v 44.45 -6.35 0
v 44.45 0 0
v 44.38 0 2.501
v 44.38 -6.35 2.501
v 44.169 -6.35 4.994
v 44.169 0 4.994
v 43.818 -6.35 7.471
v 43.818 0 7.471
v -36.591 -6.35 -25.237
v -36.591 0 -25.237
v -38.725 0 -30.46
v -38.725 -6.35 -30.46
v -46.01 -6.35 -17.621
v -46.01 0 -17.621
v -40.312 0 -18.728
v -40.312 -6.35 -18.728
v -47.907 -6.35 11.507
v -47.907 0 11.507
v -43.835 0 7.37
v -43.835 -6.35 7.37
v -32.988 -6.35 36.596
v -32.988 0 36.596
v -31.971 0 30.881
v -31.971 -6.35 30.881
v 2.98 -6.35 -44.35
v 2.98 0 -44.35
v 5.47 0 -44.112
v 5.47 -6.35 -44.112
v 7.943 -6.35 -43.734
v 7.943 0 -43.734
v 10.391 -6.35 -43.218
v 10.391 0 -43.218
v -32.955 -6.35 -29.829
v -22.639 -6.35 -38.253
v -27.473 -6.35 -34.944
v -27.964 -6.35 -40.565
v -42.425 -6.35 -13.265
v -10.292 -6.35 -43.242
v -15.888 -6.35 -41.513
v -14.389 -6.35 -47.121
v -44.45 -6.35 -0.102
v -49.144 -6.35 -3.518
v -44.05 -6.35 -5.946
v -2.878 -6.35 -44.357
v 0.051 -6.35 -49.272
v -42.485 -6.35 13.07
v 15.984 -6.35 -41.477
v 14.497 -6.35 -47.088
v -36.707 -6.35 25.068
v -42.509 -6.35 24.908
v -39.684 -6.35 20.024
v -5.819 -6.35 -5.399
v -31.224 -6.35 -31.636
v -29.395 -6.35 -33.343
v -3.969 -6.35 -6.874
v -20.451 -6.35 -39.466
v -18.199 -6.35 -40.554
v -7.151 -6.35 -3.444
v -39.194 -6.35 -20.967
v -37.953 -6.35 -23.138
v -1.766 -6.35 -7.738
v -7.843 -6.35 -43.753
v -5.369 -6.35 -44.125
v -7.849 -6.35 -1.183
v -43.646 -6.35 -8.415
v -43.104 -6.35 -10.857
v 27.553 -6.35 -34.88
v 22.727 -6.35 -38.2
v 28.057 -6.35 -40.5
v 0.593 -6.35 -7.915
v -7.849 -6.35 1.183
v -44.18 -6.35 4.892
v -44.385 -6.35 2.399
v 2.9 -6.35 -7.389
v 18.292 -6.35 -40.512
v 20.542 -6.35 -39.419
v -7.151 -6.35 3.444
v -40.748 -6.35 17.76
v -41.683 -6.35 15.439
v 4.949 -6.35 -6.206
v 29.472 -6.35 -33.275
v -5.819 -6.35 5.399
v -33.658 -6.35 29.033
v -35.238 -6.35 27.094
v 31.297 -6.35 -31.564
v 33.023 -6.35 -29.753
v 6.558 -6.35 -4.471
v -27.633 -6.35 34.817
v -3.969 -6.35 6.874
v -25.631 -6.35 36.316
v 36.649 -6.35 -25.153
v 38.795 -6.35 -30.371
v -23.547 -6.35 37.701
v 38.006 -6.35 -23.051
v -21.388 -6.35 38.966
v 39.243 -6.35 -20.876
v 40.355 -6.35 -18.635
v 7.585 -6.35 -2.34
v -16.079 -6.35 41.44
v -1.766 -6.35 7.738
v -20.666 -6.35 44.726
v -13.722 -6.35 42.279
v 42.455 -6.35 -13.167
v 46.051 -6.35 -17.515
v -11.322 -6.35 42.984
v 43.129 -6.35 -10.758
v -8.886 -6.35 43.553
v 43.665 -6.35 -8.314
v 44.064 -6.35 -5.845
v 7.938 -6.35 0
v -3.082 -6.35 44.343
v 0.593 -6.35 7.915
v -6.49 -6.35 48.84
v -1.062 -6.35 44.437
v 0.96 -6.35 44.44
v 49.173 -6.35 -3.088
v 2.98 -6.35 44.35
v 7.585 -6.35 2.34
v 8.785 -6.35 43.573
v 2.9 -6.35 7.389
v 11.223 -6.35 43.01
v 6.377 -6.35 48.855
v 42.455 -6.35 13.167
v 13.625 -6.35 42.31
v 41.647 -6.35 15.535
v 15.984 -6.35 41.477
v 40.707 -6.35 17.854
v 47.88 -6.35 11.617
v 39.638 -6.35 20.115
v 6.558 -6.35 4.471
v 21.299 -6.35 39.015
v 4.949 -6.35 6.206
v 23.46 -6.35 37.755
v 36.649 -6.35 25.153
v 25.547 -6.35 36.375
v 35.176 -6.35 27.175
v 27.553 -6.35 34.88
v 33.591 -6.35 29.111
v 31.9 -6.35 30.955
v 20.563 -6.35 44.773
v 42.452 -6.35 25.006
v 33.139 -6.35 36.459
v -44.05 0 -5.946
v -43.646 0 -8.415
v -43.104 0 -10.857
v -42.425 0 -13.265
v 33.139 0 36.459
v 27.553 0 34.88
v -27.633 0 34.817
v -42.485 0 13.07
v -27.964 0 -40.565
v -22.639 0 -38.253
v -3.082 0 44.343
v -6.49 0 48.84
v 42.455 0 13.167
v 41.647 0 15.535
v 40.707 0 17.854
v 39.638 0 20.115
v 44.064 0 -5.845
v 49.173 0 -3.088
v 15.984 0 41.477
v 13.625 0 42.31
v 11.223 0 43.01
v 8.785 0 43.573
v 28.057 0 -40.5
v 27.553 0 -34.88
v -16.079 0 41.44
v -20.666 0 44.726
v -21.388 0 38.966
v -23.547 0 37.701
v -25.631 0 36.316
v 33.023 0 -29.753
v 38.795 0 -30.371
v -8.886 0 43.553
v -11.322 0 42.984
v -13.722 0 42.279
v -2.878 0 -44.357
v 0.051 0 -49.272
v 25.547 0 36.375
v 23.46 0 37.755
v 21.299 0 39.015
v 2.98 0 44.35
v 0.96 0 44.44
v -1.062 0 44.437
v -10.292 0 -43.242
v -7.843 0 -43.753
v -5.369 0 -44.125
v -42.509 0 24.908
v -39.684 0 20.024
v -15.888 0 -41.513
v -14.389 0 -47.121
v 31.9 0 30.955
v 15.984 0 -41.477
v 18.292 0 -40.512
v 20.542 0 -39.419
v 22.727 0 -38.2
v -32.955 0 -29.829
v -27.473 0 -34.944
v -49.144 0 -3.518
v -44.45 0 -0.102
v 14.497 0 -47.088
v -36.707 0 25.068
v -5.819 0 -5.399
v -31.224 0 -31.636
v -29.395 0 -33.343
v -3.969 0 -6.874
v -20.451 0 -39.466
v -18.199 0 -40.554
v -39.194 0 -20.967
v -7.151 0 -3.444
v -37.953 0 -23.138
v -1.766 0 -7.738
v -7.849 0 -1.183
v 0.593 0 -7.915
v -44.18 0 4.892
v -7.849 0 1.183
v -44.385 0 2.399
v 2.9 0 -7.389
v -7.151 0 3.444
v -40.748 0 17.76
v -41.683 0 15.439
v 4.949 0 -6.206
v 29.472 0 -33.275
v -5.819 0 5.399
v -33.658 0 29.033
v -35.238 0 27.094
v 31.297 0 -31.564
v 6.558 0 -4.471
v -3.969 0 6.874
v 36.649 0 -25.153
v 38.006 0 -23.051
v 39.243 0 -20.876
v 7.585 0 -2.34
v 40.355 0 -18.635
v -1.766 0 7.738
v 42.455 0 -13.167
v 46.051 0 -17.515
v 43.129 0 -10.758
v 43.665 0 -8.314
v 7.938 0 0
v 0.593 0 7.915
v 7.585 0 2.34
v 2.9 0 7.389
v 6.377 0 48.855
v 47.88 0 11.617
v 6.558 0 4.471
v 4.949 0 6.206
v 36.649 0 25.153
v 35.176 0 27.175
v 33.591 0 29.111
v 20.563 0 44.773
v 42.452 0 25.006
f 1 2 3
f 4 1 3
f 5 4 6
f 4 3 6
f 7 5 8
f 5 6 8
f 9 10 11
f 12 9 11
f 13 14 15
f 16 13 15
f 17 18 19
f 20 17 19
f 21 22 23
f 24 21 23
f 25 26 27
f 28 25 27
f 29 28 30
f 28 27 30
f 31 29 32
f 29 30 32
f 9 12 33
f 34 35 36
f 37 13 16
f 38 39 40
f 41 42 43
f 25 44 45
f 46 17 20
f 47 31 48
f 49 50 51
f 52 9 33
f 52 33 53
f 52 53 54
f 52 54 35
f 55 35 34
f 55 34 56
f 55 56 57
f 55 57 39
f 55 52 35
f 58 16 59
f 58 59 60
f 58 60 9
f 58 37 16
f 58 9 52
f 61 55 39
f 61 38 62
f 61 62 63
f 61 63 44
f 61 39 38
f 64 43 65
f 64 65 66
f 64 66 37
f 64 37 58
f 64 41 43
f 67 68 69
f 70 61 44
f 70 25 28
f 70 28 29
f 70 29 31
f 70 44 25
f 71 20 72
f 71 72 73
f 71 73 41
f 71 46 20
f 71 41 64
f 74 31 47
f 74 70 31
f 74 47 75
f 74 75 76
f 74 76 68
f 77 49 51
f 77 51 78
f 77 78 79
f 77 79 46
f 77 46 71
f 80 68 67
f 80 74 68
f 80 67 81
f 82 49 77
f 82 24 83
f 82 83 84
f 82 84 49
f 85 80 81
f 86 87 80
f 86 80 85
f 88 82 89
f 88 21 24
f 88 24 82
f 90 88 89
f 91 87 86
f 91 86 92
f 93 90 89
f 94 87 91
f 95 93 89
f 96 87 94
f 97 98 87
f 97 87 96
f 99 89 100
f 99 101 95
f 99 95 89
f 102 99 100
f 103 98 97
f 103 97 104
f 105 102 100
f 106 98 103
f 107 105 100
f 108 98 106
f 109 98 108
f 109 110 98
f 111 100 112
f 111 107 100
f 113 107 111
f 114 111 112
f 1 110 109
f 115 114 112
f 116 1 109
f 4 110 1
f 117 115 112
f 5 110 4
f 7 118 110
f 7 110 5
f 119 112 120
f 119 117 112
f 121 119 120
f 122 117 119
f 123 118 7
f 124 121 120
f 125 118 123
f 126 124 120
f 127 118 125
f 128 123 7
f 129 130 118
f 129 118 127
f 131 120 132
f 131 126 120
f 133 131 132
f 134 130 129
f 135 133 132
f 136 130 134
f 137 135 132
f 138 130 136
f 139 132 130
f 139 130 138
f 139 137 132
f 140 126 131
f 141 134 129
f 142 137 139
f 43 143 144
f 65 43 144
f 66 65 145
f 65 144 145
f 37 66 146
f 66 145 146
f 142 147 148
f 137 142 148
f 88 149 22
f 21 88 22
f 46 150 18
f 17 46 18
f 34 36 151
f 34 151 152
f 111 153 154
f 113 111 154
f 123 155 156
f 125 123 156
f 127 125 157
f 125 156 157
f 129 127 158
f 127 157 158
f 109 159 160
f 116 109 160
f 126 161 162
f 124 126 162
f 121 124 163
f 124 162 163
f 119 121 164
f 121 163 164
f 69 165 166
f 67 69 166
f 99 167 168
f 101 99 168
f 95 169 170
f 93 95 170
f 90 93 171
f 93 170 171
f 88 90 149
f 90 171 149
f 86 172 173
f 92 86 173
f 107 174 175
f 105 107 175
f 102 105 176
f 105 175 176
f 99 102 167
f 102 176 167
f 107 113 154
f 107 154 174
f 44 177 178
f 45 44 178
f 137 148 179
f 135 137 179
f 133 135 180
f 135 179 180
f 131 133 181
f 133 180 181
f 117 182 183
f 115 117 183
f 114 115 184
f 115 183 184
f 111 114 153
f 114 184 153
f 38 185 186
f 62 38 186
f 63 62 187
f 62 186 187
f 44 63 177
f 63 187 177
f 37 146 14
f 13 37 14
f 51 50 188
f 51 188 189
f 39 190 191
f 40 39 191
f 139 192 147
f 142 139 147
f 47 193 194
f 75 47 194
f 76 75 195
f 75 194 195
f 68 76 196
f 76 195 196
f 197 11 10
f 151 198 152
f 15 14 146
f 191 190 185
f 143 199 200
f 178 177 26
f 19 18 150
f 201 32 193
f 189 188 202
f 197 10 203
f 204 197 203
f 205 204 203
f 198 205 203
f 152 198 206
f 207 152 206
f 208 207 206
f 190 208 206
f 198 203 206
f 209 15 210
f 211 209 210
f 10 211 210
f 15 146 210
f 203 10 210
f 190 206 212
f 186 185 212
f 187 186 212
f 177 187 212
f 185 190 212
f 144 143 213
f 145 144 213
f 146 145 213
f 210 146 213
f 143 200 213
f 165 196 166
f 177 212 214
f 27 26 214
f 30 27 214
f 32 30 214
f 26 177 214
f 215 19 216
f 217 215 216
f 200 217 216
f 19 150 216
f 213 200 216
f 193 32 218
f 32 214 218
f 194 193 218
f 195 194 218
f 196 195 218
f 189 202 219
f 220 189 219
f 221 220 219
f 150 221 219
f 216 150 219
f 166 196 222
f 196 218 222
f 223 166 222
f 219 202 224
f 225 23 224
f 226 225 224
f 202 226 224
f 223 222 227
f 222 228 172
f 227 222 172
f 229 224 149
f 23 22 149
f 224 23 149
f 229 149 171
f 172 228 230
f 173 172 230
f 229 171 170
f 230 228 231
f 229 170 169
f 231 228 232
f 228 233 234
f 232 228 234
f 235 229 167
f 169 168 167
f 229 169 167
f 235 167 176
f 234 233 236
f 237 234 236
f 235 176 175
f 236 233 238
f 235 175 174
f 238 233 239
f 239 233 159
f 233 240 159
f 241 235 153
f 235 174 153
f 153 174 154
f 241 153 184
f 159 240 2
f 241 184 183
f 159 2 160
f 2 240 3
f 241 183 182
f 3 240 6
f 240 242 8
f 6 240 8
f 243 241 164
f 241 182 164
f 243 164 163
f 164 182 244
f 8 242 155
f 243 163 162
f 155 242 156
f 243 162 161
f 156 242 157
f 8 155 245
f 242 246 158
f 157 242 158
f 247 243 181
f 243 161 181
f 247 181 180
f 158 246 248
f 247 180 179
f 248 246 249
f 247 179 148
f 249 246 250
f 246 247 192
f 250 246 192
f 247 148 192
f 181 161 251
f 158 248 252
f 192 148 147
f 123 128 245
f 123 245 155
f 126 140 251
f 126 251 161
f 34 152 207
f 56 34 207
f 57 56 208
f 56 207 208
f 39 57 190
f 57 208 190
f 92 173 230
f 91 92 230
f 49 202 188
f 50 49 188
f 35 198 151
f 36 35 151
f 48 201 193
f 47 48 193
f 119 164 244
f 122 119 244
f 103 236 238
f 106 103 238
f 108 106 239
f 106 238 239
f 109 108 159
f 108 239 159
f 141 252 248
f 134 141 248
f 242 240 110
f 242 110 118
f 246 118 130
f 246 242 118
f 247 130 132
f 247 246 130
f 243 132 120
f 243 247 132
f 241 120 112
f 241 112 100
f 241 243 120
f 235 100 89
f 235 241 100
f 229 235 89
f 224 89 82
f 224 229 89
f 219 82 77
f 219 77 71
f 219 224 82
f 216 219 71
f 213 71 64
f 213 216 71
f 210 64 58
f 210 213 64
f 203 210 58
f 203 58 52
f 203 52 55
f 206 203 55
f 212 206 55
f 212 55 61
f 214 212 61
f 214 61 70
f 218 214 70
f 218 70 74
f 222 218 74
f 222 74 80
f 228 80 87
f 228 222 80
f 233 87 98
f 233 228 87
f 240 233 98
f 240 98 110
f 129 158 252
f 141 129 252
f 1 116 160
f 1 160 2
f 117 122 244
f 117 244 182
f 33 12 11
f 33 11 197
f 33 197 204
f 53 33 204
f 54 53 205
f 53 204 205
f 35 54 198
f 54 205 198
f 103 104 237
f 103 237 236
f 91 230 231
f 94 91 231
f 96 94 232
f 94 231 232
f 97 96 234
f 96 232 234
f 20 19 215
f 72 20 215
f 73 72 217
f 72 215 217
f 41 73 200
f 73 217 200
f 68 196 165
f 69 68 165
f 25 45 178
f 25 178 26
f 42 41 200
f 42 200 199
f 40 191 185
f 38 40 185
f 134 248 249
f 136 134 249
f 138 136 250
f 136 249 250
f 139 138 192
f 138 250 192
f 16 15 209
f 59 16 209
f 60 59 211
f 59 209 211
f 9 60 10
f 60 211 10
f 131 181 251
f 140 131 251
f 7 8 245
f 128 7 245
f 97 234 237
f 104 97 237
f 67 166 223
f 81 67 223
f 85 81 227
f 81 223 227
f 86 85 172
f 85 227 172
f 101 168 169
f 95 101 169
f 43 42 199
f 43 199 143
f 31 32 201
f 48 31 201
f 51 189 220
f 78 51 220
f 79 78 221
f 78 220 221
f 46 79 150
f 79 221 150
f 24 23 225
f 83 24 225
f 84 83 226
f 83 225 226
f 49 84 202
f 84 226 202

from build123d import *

# Parameters (mm, degrees)
F0_R     = 7.9375
F1_DEPTH = 6.35


with BuildPart() as f1:
    # F0 (on Front) → F1 (new body)
    with BuildSketch(Plane.XZ):
        with BuildLine():
            ThreePointArc((44.0640721068, -5.844659902), (44.3534130882, -2.9286938091), (44.45, 0))
            ThreePointArc((44.45, 0), (44.2916429403, 3.7487151993), (43.8177000834, 7.4707201392))
            ThreePointArc((43.8177000834, 7.4707201392), (43.2302609799, 10.3415199856), (42.4549488772, 13.1673769534))
            ThreePointArc((42.4549488772, 13.1673769534), (41.1932213858, 16.7009284729), (39.6379848993, 20.1154829204))
            ThreePointArc((39.6379848993, 20.1154829204), (38.2264978161, 22.6834160724), (36.6488834271, 25.1527700969))
            ThreePointArc((36.6488834271, 25.1527700969), (34.3970458346, 28.1539648691), (31.900123201, 30.9545576574))
            ThreePointArc((31.900123201, 30.9545576574), (29.7912918003, 32.9891108226), (27.552991384, 34.8802976735))
            ThreePointArc((27.552991384, 34.8802976735), (24.5131823233, 37.0797302092), (21.2987124989, 39.0149631025))
            ThreePointArc((21.2987124989, 39.0149631025), (20.0011436472, 39.6958027102), (18.6818383084, 40.3335024194))
            Line((18.6818383084, 40.3335024194), (15.9837753185, 41.476757667))
            ThreePointArc((15.9837753185, 41.476757667), (12.4288665323, 42.6769935296), (8.7853998717, 43.5731482578))
            Line((8.7853998717, 43.5731482578), (5.8953894288, 44.0573136208))
            ThreePointArc((5.8953894288, 44.0573136208), (4.4399865206, 44.227695166), (2.9797584028, 44.3500117233))
            ThreePointArc((2.9797584028, 44.3500117233), (-0.0511777408, 44.4499705381), (-3.0818756726, 44.3430326245))
            ThreePointArc((-3.0818756726, 44.3430326245), (-5.99682497, 44.0436214483), (-8.8857128589, 43.5528025159))
            ThreePointArc((-8.8857128589, 43.5528025159), (-12.5271062762, 42.6482603203), (-16.0792418436, 41.4398417195))
            ThreePointArc((-16.0792418436, 41.4398417195), (-18.7746650962, 40.2903766491), (-21.3884961364, 38.9658149282))
            ThreePointArc((-21.3884961364, 38.9658149282), (-24.5985011604, 37.0231851772), (-27.6332375088, 34.8167586772))
            ThreePointArc((-27.6332375088, 34.8167586772), (-29.8671771379, 32.9204226858), (-31.9713179637, 30.8810188896))
            ThreePointArc((-31.9713179637, 30.8810188896), (-34.4617850273, 28.0746838403), (-36.7067057715, 25.0683116983))
            ThreePointArc((-36.7067057715, 25.0683116983), (-38.2786297743, 22.5953314338), (-39.6841999125, 20.0241548461))
            ThreePointArc((-39.6841999125, 20.0241548461), (-41.2315695506, 16.6060281944), (-42.4851569561, 13.0695806519))
            ThreePointArc((-42.4851569561, 13.0695806519), (-43.253959877, 10.2419458581), (-43.8347868066, 7.3698009215))
            ThreePointArc((-43.8347868066, 7.3698009215), (-44.3001577128, 3.6467144971), (-44.4498821525, -0.1023554137))
            ThreePointArc((-44.4498821525, -0.1023554137), (-44.3465515673, -3.0308190466), (-44.0504967316, -5.9461111405))
            ThreePointArc((-44.0504967316, -5.9461111405), (-43.3920943841, -9.6399504647), (-42.424515682, -13.2651034351))
            ThreePointArc((-42.424515682, -13.2651034351), (-41.4583271722, -16.0315192069), (-40.3119662534, -18.7282641156))
            ThreePointArc((-40.3119662534, -18.7282641156), (-38.5888928498, -22.0612748641), (-36.5908667529, -25.2370951235))
            ThreePointArc((-36.5908667529, -25.2370951235), (-34.8485512733, -27.5931327354), (-32.954788597, -29.8292542402))
            ThreePointArc((-32.954788597, -29.8292542402), (-30.3217176818, -32.5022451044), (-27.4725991601, -34.943651718))
            ThreePointArc((-27.4725991601, -34.943651718), (-25.1105575411, -36.6778189097), (-22.6393887587, -38.2525891494))
            ThreePointArc((-22.6393887587, -38.2525891494), (-19.3326807859, -40.025616218), (-15.8882240398, -41.5134536851))
            ThreePointArc((-15.8882240398, -41.5134536851), (-13.1184874977, -42.4700810662), (-10.2917397433, -43.2421390897))
            ThreePointArc((-10.2917397433, -43.2421390897), (-6.6082249244, -43.9560446736), (-2.877625333, -44.3567556573))
            ThreePointArc((-2.877625333, -44.3567556573), (0.0511777408, -44.4499705381), (2.9797584028, -44.3500117233))
            ThreePointArc((2.9797584028, -44.3500117233), (6.7094253828, -43.9407113169), (10.391286519, -43.2183255631))
            ThreePointArc((10.391286519, -43.2183255631), (13.2162489541, -42.4397604091), (15.9837753185, -41.476757667))
            ThreePointArc((15.9837753185, -41.476757667), (19.4247968758, -39.9809925631), (22.7274133165, -38.2003558091))
            ThreePointArc((22.7274133165, -38.2003558091), (25.1949493097, -36.619899362), (27.552991384, -34.8802976735))
            ThreePointArc((27.552991384, -34.8802976735), (30.3964805031, -32.4323368419), (33.0233893173, -29.7532898685))
            ThreePointArc((33.0233893173, -29.7532898685), (34.9119978358, -27.5128135078), (36.6488834271, -25.1527700969))
            ThreePointArc((36.6488834271, -25.1527700969), (38.6395912369, -21.9723573847), (40.3549851186, -18.6353877362))
            ThreePointArc((40.3549851186, -18.6353877362), (40.9473091431, -17.2950968178), (41.4951331794, -15.9360102417))
            Line((41.4951331794, -15.9360102417), (42.4549488772, -13.1673769534))
            ThreePointArc((42.4549488772, -13.1673769534), (43.4141773417, -9.5400055419), (44.0640721068, -5.844659902))
        make_face()
        Circle(F0_R, mode=Mode.SUBTRACT)
        with BuildLine():
            Line((49.1725476546, -3.0876265469), (44.45, 0))
            ThreePointArc((44.45, 0), (44.3534130882, -2.9286938091), (44.0640721068, -5.844659902))
            Line((44.0640721068, -5.844659902), (49.1725476546, -3.0876265469))
        make_face()
        with BuildLine():
            ThreePointArc((42.4549488772, 13.1673769534), (43.2302609799, 10.3415199856), (43.8177000834, 7.4707201392))
            Line((43.8177000834, 7.4707201392), (47.8801786158, 11.6172878184))
            Line((47.8801786158, 11.6172878184), (42.4549488772, 13.1673769534))
        make_face()
        with BuildLine():
            Line((46.0508898584, -17.5153767813), (42.4549488772, -13.1673769534))
            ThreePointArc((42.4549488772, -13.1673769534), (41.997861873, -14.5596050118), (41.4951331794, -15.9360102417))
            ThreePointArc((41.4951331794, -15.9360102417), (40.9473091431, -17.2950968178), (40.3549851186, -18.6353877362))
            Line((40.3549851186, -18.6353877362), (46.0508898584, -17.5153767813))
        make_face()
        with BuildLine():
            ThreePointArc((41.4951331794, -15.9360102417), (41.997861873, -14.5596050118), (42.4549488772, -13.1673769534))
            Line((42.4549488772, -13.1673769534), (41.4951331794, -15.9360102417))
        make_face()
        with BuildLine():
            ThreePointArc((36.6488834271, 25.1527700969), (38.2264978161, 22.6834160724), (39.6379848993, 20.1154829204))
            Line((39.6379848993, 20.1154829204), (42.4520045518, 25.0060030808))
            Line((42.4520045518, 25.0060030808), (36.6488834271, 25.1527700969))
        make_face()
        with BuildLine():
            ThreePointArc((27.552991384, 34.8802976735), (29.7912918003, 32.9891108226), (31.900123201, 30.9545576574))
            Line((31.900123201, 30.9545576574), (33.1391274312, 36.4591705012))
            Line((33.1391274312, 36.4591705012), (27.552991384, 34.8802976735))
        make_face()
        with BuildLine():
            Line((38.7954242099, -30.3708403064), (36.6488834271, -25.1527700969))
            ThreePointArc((36.6488834271, -25.1527700969), (34.9119978358, -27.5128135078), (33.0233893173, -29.7532898685))
            Line((33.0233893173, -29.7532898685), (38.7954242099, -30.3708403064))
        make_face()
        with BuildLine():
            ThreePointArc((18.6818383084, 40.3335024194), (20.0011436472, 39.6958027102), (21.2987124989, 39.0149631025))
            Line((21.2987124989, 39.0149631025), (20.5630526794, 44.7731364218))
            Line((20.5630526794, 44.7731364218), (15.9837753185, 41.476757667))
            ThreePointArc((15.9837753185, 41.476757667), (17.3422302537, 40.9273692024), (18.6818383084, 40.3335024194))
        make_face()
        with BuildLine():
            Line((28.0574454172, -40.500032558), (27.552991384, -34.8802976735))
            ThreePointArc((27.552991384, -34.8802976735), (25.1949493097, -36.619899362), (22.7274133165, -38.2003558091))
            Line((22.7274133165, -38.2003558091), (28.0574454172, -40.500032558))
        make_face()
        with BuildLine():
            Line((15.9837753185, 41.476757667), (18.6818383084, 40.3335024194))
            ThreePointArc((18.6818383084, 40.3335024194), (17.3422302537, 40.9273692024), (15.9837753185, 41.476757667))
        make_face()
        with BuildLine():
            Line((14.4973696484, -47.0882061011), (15.9837753185, -41.476757667))
            ThreePointArc((15.9837753185, -41.476757667), (13.2162489541, -42.4397604091), (10.391286519, -43.2183255631))
            Line((10.391286519, -43.2183255631), (14.4973696484, -47.0882061011))
        make_face()
        with BuildLine():
            Line((5.8953894288, 44.0573136208), (8.7853998717, 43.5731482578))
            ThreePointArc((8.7853998717, 43.5731482578), (7.3443854505, 43.839052252), (5.8953894288, 44.0573136208))
        make_face()
        with BuildLine():
            ThreePointArc((5.8953894288, 44.0573136208), (7.3443854505, 43.839052252), (8.7853998717, 43.5731482578))
            Line((8.7853998717, 43.5731482578), (6.3770210487, 48.8549535164))
            Line((6.3770210487, 48.8549535164), (2.9797584028, 44.3500117233))
            ThreePointArc((2.9797584028, 44.3500117233), (4.4399865206, 44.227695166), (5.8953894288, 44.0573136208))
        make_face()
        with BuildLine():
            Line((0.0511777408, -49.2717251549), (2.9797584028, -44.3500117233))
            ThreePointArc((2.9797584028, -44.3500117233), (0.0511777408, -44.4499705381), (-2.877625333, -44.3567556573))
            Line((-2.877625333, -44.3567556573), (0.0511777408, -49.2717251549))
        make_face()
        with BuildLine():
            ThreePointArc((-8.8857128589, 43.5528025159), (-5.99682497, 44.0436214483), (-3.0818756726, 44.3430326245))
            Line((-3.0818756726, 44.3430326245), (-6.4895028814, 48.8401395667))
            Line((-6.4895028814, 48.8401395667), (-8.8857128589, 43.5528025159))
        make_face()
        with BuildLine():
            Line((-14.3889007778, -47.1214644822), (-10.2917397433, -43.2421390897))
            ThreePointArc((-10.2917397433, -43.2421390897), (-13.1184874977, -42.4700810662), (-15.8882240398, -41.5134536851))
            Line((-15.8882240398, -41.5134536851), (-14.3889007778, -47.1214644822))
        make_face()
        with BuildLine():
            ThreePointArc((-21.3884961364, 38.9658149282), (-18.7746650962, 40.2903766491), (-16.0792418436, 41.4398417195))
            Line((-16.0792418436, 41.4398417195), (-20.6660976647, 44.7256669917))
            Line((-20.6660976647, 44.7256669917), (-21.3884961364, 38.9658149282))
        make_face()
        with BuildLine():
            Line((-27.964111242, -40.564533314), (-22.6393887587, -38.2525891494))
            ThreePointArc((-22.6393887587, -38.2525891494), (-25.1105575411, -36.6778189097), (-27.4725991601, -34.943651718))
            Line((-27.4725991601, -34.943651718), (-27.964111242, -40.564533314))
        make_face()
        with BuildLine():
            ThreePointArc((-31.9713179637, 30.8810188896), (-29.8671771379, 32.9204226858), (-27.6332375088, 34.8167586772))
            Line((-27.6332375088, 34.8167586772), (-32.9875778767, 36.596346626))
            Line((-32.9875778767, 36.596346626), (-31.9713179637, 30.8810188896))
        make_face()
        with BuildLine():
            Line((-38.7253861476, -30.4600943574), (-32.954788597, -29.8292542402))
            ThreePointArc((-32.954788597, -29.8292542402), (-34.8485512733, -27.5931327354), (-36.5908667529, -25.2370951235))
            Line((-36.5908667529, -25.2370951235), (-38.7253861476, -30.4600943574))
        make_face()
        with BuildLine():
            ThreePointArc((-39.6841999125, 20.0241548461), (-38.2786297743, 22.5953314338), (-36.7067057715, 25.0683116983))
            Line((-36.7067057715, 25.0683116983), (-42.509473549, 24.9081821723))
            Line((-42.509473549, 24.9081821723), (-39.6841999125, 20.0241548461))
        make_face()
        with BuildLine():
            Line((-46.0104349513, -17.621372141), (-40.3119662534, -18.7282641156))
            ThreePointArc((-40.3119662534, -18.7282641156), (-41.4583271722, -16.0315192069), (-42.424515682, -13.2651034351))
            Line((-42.424515682, -13.2651034351), (-46.0104349513, -17.621372141))
        make_face()
        with BuildLine():
            ThreePointArc((-43.8347868066, 7.3698009215), (-43.253959877, 10.2419458581), (-42.4851569561, 13.0695806519))
            Line((-42.4851569561, 13.0695806519), (-47.906802907, 11.5070029014))
            Line((-47.906802907, 11.5070029014), (-43.8347868066, 7.3698009215))
        make_face()
        with BuildLine():
            Line((-49.1436337538, -3.5179741351), (-44.0504967316, -5.9461111405))
            ThreePointArc((-44.0504967316, -5.9461111405), (-44.3465515673, -3.0308190466), (-44.4498821525, -0.1023554137))
            Line((-44.4498821525, -0.1023554137), (-49.1436337538, -3.5179741351))
        make_face()
    extrude(amount=F1_DEPTH)


solid = f1.part
